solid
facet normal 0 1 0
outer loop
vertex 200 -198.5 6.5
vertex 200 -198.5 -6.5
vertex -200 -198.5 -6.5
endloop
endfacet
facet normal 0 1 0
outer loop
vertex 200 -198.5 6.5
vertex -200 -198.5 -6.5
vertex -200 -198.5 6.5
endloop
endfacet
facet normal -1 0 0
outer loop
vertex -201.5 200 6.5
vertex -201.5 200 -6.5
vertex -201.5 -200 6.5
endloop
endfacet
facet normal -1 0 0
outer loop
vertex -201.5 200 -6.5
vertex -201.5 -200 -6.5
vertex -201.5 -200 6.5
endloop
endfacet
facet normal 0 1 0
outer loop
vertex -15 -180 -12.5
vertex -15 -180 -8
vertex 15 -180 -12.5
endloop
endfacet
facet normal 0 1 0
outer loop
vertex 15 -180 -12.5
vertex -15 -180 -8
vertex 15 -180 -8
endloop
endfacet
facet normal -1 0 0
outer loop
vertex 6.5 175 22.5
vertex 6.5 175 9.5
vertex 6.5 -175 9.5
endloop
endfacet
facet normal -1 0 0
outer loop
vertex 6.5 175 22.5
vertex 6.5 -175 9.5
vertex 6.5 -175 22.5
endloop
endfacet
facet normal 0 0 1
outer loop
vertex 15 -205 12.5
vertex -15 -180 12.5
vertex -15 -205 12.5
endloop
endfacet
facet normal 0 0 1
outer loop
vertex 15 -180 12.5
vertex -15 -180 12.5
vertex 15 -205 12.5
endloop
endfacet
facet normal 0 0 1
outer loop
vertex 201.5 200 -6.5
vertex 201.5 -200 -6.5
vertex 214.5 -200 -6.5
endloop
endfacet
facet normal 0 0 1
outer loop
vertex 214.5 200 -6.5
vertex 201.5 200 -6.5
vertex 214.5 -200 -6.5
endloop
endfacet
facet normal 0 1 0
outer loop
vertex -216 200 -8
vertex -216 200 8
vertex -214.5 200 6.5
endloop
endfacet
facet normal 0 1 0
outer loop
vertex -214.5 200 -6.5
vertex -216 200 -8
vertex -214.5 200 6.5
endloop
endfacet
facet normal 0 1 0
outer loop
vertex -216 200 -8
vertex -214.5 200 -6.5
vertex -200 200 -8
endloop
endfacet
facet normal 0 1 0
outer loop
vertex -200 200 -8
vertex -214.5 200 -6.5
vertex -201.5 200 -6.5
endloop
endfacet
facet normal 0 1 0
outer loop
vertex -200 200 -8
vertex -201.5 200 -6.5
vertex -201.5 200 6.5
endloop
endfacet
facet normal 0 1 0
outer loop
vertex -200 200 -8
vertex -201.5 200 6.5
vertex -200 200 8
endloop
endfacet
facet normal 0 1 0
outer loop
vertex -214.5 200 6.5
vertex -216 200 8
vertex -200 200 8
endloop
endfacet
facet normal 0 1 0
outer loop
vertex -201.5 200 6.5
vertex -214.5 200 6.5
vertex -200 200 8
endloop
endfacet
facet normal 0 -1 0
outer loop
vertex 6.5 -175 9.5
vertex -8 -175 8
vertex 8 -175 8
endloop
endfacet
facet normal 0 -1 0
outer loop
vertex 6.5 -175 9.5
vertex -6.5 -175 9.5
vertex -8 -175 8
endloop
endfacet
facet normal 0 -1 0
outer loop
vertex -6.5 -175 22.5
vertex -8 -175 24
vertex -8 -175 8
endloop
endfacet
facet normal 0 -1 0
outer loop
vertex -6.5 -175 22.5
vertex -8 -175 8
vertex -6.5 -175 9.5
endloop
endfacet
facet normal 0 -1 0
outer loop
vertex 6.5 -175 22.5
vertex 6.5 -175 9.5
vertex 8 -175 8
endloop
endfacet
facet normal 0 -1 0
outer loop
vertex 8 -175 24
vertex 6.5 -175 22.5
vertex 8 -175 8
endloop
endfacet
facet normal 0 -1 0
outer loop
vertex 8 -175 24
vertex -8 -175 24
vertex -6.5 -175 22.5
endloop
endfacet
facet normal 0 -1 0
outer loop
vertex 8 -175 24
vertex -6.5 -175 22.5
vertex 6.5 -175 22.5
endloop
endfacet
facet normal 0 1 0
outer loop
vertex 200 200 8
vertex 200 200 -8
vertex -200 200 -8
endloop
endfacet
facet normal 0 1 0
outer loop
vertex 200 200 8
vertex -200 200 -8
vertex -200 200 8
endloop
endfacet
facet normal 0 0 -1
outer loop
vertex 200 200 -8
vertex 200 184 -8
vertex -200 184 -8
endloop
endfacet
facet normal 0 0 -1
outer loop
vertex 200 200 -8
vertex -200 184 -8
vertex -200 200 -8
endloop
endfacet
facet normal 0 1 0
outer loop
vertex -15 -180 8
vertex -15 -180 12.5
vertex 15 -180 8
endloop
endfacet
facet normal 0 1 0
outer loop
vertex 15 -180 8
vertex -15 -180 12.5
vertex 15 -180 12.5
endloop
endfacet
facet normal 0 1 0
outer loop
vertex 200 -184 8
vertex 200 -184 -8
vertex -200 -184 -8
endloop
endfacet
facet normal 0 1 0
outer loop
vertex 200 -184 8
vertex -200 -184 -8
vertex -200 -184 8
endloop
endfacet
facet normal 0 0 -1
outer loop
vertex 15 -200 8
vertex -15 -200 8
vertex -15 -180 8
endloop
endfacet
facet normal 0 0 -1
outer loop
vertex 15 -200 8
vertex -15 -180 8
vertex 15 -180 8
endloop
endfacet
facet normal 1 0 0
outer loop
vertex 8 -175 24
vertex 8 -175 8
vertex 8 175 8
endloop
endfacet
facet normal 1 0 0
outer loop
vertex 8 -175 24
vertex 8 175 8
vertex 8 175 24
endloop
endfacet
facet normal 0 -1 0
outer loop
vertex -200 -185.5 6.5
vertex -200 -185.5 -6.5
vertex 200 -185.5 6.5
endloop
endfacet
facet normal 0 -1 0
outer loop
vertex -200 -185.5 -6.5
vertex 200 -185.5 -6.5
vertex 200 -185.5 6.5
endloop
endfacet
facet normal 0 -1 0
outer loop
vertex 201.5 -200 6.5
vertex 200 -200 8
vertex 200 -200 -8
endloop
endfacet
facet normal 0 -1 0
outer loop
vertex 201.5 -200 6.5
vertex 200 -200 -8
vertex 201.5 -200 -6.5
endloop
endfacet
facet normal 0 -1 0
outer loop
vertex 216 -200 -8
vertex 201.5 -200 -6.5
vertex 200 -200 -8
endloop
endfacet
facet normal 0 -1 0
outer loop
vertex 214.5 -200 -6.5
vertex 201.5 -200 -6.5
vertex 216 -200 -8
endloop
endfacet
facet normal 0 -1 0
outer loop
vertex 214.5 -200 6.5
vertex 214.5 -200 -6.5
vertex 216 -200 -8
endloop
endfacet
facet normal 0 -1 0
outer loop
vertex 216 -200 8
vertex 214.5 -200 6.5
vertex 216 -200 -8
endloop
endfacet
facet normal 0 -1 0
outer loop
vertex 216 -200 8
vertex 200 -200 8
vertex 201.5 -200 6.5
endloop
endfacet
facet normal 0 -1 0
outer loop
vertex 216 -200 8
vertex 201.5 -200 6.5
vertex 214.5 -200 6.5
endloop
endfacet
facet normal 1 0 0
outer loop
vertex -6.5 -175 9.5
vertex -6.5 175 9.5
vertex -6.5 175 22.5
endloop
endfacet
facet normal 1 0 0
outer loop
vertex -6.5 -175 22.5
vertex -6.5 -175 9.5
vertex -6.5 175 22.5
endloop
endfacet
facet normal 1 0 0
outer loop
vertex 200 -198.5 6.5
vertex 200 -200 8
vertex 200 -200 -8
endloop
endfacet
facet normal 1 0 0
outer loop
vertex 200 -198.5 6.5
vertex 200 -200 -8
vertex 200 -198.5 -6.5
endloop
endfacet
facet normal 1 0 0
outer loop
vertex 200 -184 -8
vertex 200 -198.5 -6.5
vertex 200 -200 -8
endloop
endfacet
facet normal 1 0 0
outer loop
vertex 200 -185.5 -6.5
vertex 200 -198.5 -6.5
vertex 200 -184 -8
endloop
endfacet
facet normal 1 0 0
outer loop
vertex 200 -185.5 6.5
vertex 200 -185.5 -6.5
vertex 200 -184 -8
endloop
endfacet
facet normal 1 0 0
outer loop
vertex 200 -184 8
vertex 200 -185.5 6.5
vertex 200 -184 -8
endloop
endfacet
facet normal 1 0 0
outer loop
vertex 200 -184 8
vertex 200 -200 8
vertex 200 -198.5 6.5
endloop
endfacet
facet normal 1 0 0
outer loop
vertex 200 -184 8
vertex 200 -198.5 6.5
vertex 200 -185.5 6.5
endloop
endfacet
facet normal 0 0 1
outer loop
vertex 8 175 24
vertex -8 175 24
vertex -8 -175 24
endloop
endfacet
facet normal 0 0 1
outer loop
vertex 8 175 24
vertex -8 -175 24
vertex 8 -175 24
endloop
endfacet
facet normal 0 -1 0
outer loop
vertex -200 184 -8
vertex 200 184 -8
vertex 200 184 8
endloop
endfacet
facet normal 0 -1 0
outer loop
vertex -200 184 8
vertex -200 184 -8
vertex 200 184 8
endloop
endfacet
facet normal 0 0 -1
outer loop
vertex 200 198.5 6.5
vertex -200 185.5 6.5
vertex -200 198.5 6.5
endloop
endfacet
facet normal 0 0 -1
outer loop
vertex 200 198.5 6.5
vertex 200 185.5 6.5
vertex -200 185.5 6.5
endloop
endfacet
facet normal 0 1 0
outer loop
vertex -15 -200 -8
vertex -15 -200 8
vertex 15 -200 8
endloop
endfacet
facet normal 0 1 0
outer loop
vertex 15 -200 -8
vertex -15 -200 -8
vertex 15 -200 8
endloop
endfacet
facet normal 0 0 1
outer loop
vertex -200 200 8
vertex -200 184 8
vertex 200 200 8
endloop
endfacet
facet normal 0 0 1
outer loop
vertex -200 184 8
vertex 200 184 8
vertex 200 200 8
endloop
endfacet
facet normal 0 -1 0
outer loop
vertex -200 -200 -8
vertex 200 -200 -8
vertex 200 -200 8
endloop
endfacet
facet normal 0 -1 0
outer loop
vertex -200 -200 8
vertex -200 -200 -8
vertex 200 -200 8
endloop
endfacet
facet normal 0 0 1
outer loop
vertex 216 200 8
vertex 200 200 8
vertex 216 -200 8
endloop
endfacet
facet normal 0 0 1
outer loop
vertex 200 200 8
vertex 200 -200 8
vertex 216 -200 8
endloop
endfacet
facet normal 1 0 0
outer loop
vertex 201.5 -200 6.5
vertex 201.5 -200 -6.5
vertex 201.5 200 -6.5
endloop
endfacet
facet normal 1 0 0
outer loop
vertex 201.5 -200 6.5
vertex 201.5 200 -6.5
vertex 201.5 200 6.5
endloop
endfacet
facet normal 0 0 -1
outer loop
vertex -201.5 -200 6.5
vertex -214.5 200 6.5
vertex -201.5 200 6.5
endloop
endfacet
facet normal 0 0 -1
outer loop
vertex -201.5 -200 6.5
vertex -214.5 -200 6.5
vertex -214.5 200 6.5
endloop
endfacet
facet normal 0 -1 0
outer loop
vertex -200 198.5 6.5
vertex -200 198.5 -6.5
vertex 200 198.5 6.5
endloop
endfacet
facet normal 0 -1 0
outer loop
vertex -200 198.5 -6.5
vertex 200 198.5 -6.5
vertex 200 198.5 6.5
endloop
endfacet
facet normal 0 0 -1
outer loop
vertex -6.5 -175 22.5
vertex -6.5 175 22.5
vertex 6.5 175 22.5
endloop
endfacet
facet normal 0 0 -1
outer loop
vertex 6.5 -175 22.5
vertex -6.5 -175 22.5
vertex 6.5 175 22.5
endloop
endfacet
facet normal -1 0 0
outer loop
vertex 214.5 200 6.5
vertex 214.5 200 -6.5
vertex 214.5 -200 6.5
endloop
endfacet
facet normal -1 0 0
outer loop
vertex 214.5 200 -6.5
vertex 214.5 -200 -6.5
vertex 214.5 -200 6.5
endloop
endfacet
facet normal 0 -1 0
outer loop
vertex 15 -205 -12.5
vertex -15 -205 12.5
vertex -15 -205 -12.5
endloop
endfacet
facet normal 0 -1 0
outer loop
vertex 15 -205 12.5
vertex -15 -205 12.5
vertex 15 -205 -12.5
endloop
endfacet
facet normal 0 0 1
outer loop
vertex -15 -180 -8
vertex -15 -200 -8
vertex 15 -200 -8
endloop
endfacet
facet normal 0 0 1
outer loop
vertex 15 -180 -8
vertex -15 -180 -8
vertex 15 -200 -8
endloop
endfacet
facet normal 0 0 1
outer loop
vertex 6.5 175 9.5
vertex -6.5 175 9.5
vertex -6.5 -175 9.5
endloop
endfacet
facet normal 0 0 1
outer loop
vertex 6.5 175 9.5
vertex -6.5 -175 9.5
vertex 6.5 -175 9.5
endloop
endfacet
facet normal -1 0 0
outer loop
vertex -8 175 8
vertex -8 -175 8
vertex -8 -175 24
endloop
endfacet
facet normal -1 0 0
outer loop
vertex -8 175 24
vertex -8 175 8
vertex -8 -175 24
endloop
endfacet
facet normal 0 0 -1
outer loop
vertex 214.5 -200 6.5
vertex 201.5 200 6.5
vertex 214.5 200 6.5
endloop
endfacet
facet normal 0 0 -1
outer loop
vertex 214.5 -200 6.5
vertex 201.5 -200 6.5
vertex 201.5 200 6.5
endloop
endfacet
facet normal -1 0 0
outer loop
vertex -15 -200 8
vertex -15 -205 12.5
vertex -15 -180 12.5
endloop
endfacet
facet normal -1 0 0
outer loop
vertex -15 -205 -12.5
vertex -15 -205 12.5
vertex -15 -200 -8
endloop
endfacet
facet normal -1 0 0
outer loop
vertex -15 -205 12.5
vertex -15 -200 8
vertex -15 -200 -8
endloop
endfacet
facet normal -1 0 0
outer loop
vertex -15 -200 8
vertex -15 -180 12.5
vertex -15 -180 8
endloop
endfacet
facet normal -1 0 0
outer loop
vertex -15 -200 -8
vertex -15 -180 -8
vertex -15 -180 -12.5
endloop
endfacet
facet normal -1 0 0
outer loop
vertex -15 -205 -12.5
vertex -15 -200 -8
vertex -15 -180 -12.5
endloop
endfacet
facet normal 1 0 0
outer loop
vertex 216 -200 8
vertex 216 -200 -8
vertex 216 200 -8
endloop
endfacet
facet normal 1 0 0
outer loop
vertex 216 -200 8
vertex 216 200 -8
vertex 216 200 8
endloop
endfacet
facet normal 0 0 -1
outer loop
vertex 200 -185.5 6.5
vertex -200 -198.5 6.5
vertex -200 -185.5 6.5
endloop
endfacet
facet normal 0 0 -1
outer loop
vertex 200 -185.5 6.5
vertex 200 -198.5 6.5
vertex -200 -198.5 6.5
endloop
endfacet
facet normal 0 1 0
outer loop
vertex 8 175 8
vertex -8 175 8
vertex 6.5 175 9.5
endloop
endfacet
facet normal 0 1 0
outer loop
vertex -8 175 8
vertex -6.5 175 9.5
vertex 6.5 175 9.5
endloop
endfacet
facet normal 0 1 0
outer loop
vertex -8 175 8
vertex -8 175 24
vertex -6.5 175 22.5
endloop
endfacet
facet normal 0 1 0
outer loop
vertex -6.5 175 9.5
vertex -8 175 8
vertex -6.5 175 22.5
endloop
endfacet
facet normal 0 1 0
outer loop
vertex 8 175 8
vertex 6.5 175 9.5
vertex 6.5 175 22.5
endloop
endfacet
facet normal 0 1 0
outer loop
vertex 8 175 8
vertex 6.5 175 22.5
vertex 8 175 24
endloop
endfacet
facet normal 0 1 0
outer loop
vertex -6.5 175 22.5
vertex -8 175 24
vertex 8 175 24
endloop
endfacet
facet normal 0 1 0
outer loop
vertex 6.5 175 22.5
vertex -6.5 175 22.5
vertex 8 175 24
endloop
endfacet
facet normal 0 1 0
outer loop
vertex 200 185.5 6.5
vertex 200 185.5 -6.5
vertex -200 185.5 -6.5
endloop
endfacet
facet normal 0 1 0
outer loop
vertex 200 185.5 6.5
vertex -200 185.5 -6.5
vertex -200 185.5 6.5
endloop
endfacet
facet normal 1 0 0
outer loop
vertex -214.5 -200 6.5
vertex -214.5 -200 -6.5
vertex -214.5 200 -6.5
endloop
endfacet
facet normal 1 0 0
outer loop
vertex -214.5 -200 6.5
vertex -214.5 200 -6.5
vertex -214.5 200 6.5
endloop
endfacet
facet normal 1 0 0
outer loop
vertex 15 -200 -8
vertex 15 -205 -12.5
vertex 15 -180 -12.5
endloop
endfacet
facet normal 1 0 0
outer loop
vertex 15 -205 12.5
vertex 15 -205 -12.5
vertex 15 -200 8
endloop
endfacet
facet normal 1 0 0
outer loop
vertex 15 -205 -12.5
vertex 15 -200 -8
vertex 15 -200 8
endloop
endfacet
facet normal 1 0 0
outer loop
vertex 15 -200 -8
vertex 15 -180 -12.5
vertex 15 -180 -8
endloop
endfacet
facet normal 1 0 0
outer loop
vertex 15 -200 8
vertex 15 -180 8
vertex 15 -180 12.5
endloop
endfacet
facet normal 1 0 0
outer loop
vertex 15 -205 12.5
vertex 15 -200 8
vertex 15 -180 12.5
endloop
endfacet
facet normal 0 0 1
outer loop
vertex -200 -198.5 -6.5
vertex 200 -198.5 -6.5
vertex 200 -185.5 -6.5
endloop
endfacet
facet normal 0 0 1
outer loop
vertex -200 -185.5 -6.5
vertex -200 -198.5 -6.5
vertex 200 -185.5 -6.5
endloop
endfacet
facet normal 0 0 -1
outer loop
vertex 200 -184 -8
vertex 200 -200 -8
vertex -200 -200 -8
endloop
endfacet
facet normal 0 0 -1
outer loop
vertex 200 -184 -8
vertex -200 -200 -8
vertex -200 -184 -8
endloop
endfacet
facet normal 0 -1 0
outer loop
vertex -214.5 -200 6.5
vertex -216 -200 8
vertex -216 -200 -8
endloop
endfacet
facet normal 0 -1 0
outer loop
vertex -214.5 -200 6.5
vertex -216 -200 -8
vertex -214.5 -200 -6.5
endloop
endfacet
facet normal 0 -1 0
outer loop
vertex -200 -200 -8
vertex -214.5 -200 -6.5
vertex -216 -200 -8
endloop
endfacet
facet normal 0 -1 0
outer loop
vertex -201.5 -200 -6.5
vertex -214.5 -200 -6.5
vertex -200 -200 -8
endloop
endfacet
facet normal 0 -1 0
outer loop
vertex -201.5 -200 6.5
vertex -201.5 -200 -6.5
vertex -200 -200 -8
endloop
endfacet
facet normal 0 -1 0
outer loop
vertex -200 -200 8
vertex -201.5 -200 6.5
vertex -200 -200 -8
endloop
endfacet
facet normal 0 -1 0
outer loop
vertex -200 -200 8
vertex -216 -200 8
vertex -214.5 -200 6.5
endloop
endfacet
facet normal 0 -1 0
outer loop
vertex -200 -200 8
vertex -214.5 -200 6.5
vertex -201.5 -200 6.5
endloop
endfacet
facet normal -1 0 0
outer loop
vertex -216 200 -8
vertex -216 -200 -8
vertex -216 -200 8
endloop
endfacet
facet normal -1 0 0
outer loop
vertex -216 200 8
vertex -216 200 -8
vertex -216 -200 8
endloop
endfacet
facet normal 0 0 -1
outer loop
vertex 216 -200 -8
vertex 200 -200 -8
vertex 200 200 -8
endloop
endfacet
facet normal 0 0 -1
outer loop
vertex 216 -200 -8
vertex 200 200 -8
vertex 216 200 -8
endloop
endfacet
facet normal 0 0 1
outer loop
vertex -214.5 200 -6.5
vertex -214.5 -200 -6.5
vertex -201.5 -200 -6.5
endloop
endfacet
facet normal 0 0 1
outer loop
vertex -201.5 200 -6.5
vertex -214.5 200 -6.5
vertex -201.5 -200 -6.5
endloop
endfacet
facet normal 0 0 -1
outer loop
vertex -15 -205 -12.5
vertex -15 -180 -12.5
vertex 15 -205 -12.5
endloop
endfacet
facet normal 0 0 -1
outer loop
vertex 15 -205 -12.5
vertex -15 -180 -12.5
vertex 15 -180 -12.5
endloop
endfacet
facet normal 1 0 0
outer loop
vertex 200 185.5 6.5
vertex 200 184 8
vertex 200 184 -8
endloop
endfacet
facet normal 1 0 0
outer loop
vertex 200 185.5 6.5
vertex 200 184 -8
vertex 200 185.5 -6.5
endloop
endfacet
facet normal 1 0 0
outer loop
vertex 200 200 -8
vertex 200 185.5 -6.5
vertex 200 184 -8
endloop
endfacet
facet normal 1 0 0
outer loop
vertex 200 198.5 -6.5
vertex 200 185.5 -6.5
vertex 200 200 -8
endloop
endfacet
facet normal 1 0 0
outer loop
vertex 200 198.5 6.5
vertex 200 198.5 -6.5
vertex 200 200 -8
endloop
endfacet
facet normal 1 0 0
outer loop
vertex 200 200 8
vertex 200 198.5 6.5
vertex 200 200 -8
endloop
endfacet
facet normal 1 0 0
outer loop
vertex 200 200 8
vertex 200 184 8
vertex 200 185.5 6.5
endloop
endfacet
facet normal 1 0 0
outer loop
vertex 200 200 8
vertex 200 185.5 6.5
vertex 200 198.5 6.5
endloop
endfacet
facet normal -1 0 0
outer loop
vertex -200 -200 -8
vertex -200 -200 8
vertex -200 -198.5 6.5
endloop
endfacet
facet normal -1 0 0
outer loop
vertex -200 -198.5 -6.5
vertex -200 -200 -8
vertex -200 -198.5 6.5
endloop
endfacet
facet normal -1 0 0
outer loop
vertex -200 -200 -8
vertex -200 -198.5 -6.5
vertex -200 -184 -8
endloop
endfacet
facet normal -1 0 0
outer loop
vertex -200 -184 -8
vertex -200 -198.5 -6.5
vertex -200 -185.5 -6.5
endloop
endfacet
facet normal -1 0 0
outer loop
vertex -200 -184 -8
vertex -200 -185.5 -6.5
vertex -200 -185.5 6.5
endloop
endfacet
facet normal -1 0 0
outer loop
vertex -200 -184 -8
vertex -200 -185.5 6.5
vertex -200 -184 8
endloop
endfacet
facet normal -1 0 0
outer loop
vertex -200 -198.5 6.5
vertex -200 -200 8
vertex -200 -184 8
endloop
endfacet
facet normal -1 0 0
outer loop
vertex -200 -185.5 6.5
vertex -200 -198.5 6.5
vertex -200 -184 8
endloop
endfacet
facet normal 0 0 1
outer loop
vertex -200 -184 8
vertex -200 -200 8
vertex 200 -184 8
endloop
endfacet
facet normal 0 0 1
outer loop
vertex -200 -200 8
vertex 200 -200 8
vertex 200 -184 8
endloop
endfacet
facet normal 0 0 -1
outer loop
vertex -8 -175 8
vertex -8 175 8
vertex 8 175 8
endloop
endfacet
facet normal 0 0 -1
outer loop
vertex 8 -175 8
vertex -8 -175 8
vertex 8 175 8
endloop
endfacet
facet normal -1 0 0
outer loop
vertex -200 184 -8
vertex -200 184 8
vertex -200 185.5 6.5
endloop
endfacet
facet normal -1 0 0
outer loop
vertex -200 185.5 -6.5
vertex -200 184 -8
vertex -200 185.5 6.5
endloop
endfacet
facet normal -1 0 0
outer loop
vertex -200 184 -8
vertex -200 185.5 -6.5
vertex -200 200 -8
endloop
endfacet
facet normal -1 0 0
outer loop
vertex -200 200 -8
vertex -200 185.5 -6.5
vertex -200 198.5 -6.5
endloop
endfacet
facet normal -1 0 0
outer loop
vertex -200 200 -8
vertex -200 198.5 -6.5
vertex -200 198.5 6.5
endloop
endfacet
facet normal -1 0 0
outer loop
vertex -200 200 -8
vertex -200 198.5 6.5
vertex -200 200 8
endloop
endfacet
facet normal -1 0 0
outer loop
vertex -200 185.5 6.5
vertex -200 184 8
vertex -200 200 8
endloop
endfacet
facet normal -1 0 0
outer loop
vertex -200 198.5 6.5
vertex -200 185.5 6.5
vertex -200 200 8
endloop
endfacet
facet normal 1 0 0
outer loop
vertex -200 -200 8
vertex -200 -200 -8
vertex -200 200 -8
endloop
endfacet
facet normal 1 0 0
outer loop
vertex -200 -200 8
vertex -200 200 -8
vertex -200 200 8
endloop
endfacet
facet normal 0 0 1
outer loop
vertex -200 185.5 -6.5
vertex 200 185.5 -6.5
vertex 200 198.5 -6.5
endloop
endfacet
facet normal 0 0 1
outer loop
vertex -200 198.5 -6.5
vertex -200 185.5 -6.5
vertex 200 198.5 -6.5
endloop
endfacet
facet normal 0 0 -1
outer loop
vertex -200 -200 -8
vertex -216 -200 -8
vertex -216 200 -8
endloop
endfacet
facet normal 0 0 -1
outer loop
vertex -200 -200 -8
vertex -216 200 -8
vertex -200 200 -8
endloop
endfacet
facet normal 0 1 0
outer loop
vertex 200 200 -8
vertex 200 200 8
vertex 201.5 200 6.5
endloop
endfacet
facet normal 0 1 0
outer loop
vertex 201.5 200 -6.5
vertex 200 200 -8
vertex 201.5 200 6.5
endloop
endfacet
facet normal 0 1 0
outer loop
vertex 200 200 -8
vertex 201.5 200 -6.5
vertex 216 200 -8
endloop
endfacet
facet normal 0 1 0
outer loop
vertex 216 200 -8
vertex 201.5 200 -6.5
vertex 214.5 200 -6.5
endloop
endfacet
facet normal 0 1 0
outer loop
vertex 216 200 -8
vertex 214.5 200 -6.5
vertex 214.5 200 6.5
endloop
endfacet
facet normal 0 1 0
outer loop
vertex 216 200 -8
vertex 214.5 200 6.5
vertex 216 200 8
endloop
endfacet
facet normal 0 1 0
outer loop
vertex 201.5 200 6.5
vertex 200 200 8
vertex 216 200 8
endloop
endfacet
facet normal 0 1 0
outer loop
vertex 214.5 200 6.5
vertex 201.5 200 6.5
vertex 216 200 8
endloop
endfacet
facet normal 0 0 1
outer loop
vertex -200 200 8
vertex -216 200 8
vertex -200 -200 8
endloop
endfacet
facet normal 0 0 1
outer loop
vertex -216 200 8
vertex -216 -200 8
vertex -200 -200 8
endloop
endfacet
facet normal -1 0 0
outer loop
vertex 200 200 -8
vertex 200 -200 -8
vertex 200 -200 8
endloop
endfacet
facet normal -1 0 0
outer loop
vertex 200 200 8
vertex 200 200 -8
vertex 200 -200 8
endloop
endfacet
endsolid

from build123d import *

# Parameters (mm, degrees)
F0_W          = 16
F0_H          = 16
F0_W_2        = 13
F0_H_2        = 13
F1_DEPTH      = 200
F2_W          = 16
F2_H          = 16
F2_W_2        = 13
F2_H_2        = 13
F3_DEPTH      = 200
F3_DEPTH_BACK = 200
F5_W          = 16
F5_H          = 16
F5_W_2        = 13
F5_H_2        = 13
F6_DEPTH      = 175
F7_W          = 30
F7_H          = 4.5
F8_DEPTH      = 20
F7_H_2        = 16
F9_DEPTH      = 5


with BuildPart() as f1:
    # F0 (on Front) → F1 (new body, symmetric)
    with BuildSketch(Plane.XZ):
        with Locations((-208, 0)):
            Rectangle(F0_W, F0_H)
        with Locations((-208, 0)):
            Rectangle(F0_W_2, F0_H_2, mode=Mode.SUBTRACT)
    extrude(amount=F1_DEPTH, both=True)


with BuildPart() as f1b:
    # F0 (on Front) → F1, piece 2 (new body, symmetric)
    with BuildSketch(Plane.XZ):
        with Locations((208, 0)):
            Rectangle(F0_W, F0_H)
        with Locations((208, 0)):
            Rectangle(F0_W_2, F0_H_2, mode=Mode.SUBTRACT)
    extrude(amount=F1_DEPTH, both=True)


with BuildPart() as f3:
    # F2 (on Right) → F3 (new body, two sides)
    with BuildSketch(Plane.YZ) as f3_sk:
        with Locations((-192, 0)):
            Rectangle(F2_W, F2_H)
        with Locations((-192, 0)):
            Rectangle(F2_W_2, F2_H_2, mode=Mode.SUBTRACT)
    extrude(amount=F3_DEPTH)
    extrude(f3_sk.sketch, amount=-F3_DEPTH_BACK)


with BuildPart() as f3b:
    # F2 (on Right) → F3, piece 2 (new body, two sides)
    with BuildSketch(Plane.YZ) as f3_2_sk:
        with Locations((192, 0)):
            Rectangle(F2_W, F2_H)
        with Locations((192, 0)):
            Rectangle(F2_W_2, F2_H_2, mode=Mode.SUBTRACT)
    extrude(amount=F3_DEPTH)
    extrude(f3_2_sk.sketch, amount=-F3_DEPTH_BACK)


with BuildPart() as f6:
    # F5 (on Front) → F6 (new body, symmetric)
    with BuildSketch(Plane.XZ):
        with Locations((2e-10, 16)):
            Rectangle(F5_W, F5_H)
        with Locations((2e-10, 16)):
            Rectangle(F5_W_2, F5_H_2, mode=Mode.SUBTRACT)
    extrude(amount=F6_DEPTH, both=True)


with BuildPart() as f8:
    # F7 (on face) → F8 (new body)
    with BuildSketch(Plane.XZ.offset(200)):
        with Locations((0, 10.25)):
            Rectangle(F7_W, F7_H)
    extrude(amount=-F8_DEPTH)



with BuildPart() as f8b:
    # F7 (on face) → F8, piece 2 (new body)
    with BuildSketch(Plane.XZ.offset(200)):
        with Locations((0, -10.25)):
            Rectangle(F7_W, F7_H)
    extrude(amount=-F8_DEPTH)


with BuildPart() as f8_1:
    add(f8.part)

    add(f8b.part)  # F9 merges F8b
    # F7 (on face) → F9 (join)
    with BuildSketch(Plane.XZ.offset(200)):
        with Locations((0, 10.25)):
            Rectangle(F7_W, F7_H)
        Rectangle(F7_W, F7_H_2)
        with Locations((0, -10.25)):
            Rectangle(F7_W, F7_H)
    extrude(amount=F9_DEPTH)


solid = Compound([f1.part, f1b.part, f3.part, f3b.part, f6.part, f8_1.part])
